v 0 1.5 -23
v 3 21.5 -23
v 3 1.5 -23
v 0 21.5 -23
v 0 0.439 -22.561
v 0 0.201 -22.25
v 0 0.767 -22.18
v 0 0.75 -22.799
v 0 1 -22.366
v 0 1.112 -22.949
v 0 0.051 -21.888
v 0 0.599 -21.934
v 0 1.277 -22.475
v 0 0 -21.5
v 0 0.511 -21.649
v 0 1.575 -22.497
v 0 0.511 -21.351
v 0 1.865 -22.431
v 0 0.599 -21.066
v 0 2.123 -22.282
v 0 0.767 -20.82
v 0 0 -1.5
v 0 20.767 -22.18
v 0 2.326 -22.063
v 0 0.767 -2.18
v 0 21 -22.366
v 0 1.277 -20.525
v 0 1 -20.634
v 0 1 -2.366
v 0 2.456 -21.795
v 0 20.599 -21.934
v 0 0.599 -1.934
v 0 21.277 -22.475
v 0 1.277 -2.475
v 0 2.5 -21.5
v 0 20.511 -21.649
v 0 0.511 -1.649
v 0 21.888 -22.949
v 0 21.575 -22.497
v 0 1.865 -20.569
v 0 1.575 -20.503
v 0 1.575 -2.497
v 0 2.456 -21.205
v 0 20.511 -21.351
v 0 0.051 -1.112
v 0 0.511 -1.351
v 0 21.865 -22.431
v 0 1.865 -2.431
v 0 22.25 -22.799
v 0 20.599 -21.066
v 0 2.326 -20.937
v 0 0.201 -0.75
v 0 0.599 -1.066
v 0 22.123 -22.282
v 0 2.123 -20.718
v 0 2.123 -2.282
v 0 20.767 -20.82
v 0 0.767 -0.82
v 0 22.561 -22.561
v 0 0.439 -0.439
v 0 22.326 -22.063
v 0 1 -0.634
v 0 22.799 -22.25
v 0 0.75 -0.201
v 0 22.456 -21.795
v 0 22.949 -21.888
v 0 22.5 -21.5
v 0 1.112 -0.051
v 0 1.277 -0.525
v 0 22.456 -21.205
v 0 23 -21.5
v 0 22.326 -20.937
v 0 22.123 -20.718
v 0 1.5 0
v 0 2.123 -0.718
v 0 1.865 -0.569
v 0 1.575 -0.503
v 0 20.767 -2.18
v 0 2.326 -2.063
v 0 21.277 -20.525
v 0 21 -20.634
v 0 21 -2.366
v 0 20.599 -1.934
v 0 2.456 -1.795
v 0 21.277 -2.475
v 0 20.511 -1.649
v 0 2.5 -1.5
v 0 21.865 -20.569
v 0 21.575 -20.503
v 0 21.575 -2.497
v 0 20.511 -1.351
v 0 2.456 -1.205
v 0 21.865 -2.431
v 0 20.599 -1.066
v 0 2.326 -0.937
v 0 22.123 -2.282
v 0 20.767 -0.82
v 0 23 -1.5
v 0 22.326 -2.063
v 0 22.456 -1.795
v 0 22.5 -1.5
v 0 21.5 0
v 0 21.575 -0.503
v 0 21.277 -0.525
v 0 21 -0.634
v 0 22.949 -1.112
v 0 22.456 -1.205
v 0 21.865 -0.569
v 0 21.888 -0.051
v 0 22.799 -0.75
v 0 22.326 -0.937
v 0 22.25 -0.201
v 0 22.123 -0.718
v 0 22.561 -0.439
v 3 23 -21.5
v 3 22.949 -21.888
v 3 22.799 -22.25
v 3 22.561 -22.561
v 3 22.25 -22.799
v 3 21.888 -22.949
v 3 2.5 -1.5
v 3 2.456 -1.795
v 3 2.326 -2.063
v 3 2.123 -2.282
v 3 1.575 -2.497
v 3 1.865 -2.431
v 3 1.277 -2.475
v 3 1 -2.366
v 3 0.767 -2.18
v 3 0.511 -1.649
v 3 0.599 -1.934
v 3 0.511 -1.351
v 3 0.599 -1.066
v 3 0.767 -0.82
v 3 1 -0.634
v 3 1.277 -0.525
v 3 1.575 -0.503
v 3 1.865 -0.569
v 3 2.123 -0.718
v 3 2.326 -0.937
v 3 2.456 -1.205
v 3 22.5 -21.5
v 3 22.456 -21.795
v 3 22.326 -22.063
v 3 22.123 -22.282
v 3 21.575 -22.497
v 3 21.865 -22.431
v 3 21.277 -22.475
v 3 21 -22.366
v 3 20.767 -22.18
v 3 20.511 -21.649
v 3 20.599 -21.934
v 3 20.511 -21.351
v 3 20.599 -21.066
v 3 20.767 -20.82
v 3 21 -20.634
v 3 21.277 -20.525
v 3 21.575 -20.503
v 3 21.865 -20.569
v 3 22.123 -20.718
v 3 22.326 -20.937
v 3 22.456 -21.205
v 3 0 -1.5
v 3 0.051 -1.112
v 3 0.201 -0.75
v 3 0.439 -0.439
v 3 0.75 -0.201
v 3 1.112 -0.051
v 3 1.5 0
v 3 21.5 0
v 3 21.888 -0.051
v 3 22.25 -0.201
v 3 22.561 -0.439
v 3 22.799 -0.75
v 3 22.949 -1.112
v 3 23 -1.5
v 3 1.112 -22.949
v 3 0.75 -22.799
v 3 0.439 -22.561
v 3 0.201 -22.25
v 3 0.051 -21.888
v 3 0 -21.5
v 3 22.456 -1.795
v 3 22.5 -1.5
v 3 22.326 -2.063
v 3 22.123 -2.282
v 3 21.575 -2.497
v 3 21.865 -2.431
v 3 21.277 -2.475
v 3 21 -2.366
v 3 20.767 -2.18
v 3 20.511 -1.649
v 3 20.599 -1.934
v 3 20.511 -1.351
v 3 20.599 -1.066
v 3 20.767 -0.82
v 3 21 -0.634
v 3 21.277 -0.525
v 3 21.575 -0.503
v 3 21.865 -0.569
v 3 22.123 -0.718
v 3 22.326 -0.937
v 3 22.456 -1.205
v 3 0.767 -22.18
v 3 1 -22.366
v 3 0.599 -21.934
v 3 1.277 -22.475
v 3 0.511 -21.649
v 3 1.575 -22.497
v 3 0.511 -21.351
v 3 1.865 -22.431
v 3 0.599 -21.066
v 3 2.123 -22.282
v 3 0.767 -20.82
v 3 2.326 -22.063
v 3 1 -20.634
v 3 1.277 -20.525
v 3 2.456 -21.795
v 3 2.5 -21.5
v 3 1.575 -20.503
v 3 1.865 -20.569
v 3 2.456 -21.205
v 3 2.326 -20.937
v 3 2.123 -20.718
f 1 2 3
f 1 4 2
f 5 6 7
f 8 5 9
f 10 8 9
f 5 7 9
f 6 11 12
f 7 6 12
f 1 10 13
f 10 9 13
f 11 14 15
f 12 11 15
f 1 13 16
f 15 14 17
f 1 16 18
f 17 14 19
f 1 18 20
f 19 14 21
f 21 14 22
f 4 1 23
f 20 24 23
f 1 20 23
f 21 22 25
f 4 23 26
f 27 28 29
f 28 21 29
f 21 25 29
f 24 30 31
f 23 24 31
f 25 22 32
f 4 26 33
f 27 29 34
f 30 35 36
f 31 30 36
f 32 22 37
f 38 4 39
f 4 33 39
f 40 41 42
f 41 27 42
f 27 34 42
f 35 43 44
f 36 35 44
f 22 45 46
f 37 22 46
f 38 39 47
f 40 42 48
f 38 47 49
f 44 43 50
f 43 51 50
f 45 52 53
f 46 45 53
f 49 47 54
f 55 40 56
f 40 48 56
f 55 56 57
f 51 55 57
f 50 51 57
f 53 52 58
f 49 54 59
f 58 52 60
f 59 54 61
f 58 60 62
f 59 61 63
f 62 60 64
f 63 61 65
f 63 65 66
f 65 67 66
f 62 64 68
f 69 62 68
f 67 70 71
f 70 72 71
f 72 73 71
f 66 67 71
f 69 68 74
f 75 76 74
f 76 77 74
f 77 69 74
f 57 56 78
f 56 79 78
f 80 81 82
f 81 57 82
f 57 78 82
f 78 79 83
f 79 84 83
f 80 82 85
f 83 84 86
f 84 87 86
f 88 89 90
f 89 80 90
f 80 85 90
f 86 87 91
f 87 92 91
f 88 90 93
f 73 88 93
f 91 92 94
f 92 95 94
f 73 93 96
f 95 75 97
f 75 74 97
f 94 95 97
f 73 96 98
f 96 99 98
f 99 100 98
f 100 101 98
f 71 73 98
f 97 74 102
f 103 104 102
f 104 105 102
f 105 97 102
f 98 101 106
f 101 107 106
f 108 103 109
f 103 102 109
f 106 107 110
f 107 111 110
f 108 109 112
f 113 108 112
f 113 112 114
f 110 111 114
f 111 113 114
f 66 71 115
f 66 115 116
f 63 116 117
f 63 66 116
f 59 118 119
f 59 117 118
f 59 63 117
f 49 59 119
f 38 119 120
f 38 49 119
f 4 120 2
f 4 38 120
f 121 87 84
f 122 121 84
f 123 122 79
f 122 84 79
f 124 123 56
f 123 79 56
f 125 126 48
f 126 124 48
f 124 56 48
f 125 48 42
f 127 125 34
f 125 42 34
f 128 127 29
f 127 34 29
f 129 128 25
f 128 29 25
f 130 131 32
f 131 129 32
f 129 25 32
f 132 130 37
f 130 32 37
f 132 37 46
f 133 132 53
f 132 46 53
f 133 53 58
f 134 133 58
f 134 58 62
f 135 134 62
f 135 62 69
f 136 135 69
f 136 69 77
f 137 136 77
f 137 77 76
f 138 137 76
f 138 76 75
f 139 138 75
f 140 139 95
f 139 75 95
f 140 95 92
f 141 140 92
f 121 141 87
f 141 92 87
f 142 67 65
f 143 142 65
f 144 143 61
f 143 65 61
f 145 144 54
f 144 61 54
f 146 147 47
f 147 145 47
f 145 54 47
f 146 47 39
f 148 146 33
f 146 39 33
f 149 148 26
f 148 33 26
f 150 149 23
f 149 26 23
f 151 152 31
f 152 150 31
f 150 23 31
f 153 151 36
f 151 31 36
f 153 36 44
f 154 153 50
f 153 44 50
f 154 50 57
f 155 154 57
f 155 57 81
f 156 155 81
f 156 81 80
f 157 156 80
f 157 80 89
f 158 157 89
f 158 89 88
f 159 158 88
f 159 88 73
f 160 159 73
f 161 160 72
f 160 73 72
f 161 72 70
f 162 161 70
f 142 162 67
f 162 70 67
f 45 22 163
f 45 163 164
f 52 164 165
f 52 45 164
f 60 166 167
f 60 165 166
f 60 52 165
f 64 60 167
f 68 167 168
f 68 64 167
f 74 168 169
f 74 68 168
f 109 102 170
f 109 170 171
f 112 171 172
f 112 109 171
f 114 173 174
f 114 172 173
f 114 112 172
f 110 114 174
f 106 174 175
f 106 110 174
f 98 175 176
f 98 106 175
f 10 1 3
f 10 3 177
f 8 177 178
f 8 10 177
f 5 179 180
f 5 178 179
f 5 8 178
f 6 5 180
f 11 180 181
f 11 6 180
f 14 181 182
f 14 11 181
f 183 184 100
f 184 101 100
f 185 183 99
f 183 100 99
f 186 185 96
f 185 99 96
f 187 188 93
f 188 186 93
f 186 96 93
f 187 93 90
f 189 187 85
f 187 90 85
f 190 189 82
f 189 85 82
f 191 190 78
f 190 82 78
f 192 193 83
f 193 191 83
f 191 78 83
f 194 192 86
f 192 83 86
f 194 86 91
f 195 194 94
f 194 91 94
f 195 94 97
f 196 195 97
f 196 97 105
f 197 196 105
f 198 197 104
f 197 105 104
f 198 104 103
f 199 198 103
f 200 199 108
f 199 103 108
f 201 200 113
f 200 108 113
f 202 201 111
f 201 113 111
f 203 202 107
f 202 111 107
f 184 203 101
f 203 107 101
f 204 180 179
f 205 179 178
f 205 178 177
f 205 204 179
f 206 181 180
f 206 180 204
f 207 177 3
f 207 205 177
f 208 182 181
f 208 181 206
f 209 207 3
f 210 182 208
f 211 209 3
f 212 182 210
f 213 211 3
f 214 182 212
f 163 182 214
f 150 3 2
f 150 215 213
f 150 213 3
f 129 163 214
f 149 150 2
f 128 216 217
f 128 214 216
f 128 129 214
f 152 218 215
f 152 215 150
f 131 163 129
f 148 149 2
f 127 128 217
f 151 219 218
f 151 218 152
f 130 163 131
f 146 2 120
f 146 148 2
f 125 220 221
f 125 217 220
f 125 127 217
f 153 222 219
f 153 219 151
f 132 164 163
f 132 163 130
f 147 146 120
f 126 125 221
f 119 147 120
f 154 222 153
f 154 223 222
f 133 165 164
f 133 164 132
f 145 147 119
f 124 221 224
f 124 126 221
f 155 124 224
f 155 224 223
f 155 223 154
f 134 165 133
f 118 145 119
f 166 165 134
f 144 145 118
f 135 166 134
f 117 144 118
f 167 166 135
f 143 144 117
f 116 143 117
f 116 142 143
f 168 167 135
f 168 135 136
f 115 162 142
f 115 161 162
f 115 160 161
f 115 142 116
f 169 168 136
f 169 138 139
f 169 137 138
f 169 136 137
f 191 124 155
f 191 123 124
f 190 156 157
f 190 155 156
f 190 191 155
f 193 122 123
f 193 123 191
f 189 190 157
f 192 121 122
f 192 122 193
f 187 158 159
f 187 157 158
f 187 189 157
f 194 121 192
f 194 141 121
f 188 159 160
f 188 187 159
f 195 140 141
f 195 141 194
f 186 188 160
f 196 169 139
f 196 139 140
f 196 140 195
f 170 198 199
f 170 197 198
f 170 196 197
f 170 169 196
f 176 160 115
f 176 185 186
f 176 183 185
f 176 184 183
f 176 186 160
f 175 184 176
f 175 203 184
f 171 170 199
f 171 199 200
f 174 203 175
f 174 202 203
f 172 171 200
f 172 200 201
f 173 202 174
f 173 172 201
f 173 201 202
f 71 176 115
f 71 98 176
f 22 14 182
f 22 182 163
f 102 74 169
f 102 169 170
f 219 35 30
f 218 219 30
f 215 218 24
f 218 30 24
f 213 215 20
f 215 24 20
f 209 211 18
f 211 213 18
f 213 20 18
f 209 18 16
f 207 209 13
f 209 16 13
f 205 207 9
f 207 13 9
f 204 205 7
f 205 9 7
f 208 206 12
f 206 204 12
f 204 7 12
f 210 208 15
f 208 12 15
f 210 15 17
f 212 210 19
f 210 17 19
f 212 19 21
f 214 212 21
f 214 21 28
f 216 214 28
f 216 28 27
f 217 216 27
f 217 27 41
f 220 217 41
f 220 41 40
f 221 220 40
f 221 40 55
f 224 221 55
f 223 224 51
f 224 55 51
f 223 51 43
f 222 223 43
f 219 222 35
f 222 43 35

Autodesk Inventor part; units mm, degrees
ref_plane "YZ Plane" through (0, 0, 0) normal (1, 0, 0) x (0, 1, 0)
ref_plane "XZ Plane" through (0, 0, 0) normal (0, 1, 0) x (-1, 0, 0)
ref_plane "XY Plane" through (0, 0, 0) normal (0, 0, 1) x (1, 0, 0)
sketch "Náčrt1" plane through (0, 0, 0) normal (1, 0, 0) x (0, 1, 0)
  line L0 (1.5, 0) -> (21.5, 0)
  line L1 (23, -1.5) -> (23, -21.5)
  line L2 (21.5, -23) -> (1.5, -23)
  line L3 (0, -21.5) -> (0, -1.5)
  arc A0 (23, -1.5) -> (21.5, 0) centre (21.5, -1.5) ccw
  arc A1 (21.5, -23) -> (23, -21.5) centre (21.5, -21.5) ccw
  arc A2 (0, -21.5) -> (1.5, -23) centre (1.5, -21.5) ccw
  arc A3 (1.5, 0) -> (0, -1.5) centre (1.5, -1.5) ccw
  circle A4 centre (21.5, -1.5) radius 1
  circle A5 centre (1.5, -21.5) radius 1
  circle A6 centre (1.5, -1.5) radius 1
  circle A7 centre (21.5, -21.5) radius 1
  point P0 (0, 0)
  point P1 (23, 0)
  point P2 (0, -23)
  dimension "d0" = 23
  dimension "d1" = 23
  dimension "d2" = 1.5
  dimension "d3" = 1.5
  dimension "d4" = 2
  dimension "d5" = 2
  dimension "d6" = 2
  dimension "d7" = 2
extrude "Vysunutí1" add sketch "Náčrt1" along normal blind 3
equation "\"d1\" = d0"
properties part number "HGLRC Micro 13A 4in1 BLHeli_S"
